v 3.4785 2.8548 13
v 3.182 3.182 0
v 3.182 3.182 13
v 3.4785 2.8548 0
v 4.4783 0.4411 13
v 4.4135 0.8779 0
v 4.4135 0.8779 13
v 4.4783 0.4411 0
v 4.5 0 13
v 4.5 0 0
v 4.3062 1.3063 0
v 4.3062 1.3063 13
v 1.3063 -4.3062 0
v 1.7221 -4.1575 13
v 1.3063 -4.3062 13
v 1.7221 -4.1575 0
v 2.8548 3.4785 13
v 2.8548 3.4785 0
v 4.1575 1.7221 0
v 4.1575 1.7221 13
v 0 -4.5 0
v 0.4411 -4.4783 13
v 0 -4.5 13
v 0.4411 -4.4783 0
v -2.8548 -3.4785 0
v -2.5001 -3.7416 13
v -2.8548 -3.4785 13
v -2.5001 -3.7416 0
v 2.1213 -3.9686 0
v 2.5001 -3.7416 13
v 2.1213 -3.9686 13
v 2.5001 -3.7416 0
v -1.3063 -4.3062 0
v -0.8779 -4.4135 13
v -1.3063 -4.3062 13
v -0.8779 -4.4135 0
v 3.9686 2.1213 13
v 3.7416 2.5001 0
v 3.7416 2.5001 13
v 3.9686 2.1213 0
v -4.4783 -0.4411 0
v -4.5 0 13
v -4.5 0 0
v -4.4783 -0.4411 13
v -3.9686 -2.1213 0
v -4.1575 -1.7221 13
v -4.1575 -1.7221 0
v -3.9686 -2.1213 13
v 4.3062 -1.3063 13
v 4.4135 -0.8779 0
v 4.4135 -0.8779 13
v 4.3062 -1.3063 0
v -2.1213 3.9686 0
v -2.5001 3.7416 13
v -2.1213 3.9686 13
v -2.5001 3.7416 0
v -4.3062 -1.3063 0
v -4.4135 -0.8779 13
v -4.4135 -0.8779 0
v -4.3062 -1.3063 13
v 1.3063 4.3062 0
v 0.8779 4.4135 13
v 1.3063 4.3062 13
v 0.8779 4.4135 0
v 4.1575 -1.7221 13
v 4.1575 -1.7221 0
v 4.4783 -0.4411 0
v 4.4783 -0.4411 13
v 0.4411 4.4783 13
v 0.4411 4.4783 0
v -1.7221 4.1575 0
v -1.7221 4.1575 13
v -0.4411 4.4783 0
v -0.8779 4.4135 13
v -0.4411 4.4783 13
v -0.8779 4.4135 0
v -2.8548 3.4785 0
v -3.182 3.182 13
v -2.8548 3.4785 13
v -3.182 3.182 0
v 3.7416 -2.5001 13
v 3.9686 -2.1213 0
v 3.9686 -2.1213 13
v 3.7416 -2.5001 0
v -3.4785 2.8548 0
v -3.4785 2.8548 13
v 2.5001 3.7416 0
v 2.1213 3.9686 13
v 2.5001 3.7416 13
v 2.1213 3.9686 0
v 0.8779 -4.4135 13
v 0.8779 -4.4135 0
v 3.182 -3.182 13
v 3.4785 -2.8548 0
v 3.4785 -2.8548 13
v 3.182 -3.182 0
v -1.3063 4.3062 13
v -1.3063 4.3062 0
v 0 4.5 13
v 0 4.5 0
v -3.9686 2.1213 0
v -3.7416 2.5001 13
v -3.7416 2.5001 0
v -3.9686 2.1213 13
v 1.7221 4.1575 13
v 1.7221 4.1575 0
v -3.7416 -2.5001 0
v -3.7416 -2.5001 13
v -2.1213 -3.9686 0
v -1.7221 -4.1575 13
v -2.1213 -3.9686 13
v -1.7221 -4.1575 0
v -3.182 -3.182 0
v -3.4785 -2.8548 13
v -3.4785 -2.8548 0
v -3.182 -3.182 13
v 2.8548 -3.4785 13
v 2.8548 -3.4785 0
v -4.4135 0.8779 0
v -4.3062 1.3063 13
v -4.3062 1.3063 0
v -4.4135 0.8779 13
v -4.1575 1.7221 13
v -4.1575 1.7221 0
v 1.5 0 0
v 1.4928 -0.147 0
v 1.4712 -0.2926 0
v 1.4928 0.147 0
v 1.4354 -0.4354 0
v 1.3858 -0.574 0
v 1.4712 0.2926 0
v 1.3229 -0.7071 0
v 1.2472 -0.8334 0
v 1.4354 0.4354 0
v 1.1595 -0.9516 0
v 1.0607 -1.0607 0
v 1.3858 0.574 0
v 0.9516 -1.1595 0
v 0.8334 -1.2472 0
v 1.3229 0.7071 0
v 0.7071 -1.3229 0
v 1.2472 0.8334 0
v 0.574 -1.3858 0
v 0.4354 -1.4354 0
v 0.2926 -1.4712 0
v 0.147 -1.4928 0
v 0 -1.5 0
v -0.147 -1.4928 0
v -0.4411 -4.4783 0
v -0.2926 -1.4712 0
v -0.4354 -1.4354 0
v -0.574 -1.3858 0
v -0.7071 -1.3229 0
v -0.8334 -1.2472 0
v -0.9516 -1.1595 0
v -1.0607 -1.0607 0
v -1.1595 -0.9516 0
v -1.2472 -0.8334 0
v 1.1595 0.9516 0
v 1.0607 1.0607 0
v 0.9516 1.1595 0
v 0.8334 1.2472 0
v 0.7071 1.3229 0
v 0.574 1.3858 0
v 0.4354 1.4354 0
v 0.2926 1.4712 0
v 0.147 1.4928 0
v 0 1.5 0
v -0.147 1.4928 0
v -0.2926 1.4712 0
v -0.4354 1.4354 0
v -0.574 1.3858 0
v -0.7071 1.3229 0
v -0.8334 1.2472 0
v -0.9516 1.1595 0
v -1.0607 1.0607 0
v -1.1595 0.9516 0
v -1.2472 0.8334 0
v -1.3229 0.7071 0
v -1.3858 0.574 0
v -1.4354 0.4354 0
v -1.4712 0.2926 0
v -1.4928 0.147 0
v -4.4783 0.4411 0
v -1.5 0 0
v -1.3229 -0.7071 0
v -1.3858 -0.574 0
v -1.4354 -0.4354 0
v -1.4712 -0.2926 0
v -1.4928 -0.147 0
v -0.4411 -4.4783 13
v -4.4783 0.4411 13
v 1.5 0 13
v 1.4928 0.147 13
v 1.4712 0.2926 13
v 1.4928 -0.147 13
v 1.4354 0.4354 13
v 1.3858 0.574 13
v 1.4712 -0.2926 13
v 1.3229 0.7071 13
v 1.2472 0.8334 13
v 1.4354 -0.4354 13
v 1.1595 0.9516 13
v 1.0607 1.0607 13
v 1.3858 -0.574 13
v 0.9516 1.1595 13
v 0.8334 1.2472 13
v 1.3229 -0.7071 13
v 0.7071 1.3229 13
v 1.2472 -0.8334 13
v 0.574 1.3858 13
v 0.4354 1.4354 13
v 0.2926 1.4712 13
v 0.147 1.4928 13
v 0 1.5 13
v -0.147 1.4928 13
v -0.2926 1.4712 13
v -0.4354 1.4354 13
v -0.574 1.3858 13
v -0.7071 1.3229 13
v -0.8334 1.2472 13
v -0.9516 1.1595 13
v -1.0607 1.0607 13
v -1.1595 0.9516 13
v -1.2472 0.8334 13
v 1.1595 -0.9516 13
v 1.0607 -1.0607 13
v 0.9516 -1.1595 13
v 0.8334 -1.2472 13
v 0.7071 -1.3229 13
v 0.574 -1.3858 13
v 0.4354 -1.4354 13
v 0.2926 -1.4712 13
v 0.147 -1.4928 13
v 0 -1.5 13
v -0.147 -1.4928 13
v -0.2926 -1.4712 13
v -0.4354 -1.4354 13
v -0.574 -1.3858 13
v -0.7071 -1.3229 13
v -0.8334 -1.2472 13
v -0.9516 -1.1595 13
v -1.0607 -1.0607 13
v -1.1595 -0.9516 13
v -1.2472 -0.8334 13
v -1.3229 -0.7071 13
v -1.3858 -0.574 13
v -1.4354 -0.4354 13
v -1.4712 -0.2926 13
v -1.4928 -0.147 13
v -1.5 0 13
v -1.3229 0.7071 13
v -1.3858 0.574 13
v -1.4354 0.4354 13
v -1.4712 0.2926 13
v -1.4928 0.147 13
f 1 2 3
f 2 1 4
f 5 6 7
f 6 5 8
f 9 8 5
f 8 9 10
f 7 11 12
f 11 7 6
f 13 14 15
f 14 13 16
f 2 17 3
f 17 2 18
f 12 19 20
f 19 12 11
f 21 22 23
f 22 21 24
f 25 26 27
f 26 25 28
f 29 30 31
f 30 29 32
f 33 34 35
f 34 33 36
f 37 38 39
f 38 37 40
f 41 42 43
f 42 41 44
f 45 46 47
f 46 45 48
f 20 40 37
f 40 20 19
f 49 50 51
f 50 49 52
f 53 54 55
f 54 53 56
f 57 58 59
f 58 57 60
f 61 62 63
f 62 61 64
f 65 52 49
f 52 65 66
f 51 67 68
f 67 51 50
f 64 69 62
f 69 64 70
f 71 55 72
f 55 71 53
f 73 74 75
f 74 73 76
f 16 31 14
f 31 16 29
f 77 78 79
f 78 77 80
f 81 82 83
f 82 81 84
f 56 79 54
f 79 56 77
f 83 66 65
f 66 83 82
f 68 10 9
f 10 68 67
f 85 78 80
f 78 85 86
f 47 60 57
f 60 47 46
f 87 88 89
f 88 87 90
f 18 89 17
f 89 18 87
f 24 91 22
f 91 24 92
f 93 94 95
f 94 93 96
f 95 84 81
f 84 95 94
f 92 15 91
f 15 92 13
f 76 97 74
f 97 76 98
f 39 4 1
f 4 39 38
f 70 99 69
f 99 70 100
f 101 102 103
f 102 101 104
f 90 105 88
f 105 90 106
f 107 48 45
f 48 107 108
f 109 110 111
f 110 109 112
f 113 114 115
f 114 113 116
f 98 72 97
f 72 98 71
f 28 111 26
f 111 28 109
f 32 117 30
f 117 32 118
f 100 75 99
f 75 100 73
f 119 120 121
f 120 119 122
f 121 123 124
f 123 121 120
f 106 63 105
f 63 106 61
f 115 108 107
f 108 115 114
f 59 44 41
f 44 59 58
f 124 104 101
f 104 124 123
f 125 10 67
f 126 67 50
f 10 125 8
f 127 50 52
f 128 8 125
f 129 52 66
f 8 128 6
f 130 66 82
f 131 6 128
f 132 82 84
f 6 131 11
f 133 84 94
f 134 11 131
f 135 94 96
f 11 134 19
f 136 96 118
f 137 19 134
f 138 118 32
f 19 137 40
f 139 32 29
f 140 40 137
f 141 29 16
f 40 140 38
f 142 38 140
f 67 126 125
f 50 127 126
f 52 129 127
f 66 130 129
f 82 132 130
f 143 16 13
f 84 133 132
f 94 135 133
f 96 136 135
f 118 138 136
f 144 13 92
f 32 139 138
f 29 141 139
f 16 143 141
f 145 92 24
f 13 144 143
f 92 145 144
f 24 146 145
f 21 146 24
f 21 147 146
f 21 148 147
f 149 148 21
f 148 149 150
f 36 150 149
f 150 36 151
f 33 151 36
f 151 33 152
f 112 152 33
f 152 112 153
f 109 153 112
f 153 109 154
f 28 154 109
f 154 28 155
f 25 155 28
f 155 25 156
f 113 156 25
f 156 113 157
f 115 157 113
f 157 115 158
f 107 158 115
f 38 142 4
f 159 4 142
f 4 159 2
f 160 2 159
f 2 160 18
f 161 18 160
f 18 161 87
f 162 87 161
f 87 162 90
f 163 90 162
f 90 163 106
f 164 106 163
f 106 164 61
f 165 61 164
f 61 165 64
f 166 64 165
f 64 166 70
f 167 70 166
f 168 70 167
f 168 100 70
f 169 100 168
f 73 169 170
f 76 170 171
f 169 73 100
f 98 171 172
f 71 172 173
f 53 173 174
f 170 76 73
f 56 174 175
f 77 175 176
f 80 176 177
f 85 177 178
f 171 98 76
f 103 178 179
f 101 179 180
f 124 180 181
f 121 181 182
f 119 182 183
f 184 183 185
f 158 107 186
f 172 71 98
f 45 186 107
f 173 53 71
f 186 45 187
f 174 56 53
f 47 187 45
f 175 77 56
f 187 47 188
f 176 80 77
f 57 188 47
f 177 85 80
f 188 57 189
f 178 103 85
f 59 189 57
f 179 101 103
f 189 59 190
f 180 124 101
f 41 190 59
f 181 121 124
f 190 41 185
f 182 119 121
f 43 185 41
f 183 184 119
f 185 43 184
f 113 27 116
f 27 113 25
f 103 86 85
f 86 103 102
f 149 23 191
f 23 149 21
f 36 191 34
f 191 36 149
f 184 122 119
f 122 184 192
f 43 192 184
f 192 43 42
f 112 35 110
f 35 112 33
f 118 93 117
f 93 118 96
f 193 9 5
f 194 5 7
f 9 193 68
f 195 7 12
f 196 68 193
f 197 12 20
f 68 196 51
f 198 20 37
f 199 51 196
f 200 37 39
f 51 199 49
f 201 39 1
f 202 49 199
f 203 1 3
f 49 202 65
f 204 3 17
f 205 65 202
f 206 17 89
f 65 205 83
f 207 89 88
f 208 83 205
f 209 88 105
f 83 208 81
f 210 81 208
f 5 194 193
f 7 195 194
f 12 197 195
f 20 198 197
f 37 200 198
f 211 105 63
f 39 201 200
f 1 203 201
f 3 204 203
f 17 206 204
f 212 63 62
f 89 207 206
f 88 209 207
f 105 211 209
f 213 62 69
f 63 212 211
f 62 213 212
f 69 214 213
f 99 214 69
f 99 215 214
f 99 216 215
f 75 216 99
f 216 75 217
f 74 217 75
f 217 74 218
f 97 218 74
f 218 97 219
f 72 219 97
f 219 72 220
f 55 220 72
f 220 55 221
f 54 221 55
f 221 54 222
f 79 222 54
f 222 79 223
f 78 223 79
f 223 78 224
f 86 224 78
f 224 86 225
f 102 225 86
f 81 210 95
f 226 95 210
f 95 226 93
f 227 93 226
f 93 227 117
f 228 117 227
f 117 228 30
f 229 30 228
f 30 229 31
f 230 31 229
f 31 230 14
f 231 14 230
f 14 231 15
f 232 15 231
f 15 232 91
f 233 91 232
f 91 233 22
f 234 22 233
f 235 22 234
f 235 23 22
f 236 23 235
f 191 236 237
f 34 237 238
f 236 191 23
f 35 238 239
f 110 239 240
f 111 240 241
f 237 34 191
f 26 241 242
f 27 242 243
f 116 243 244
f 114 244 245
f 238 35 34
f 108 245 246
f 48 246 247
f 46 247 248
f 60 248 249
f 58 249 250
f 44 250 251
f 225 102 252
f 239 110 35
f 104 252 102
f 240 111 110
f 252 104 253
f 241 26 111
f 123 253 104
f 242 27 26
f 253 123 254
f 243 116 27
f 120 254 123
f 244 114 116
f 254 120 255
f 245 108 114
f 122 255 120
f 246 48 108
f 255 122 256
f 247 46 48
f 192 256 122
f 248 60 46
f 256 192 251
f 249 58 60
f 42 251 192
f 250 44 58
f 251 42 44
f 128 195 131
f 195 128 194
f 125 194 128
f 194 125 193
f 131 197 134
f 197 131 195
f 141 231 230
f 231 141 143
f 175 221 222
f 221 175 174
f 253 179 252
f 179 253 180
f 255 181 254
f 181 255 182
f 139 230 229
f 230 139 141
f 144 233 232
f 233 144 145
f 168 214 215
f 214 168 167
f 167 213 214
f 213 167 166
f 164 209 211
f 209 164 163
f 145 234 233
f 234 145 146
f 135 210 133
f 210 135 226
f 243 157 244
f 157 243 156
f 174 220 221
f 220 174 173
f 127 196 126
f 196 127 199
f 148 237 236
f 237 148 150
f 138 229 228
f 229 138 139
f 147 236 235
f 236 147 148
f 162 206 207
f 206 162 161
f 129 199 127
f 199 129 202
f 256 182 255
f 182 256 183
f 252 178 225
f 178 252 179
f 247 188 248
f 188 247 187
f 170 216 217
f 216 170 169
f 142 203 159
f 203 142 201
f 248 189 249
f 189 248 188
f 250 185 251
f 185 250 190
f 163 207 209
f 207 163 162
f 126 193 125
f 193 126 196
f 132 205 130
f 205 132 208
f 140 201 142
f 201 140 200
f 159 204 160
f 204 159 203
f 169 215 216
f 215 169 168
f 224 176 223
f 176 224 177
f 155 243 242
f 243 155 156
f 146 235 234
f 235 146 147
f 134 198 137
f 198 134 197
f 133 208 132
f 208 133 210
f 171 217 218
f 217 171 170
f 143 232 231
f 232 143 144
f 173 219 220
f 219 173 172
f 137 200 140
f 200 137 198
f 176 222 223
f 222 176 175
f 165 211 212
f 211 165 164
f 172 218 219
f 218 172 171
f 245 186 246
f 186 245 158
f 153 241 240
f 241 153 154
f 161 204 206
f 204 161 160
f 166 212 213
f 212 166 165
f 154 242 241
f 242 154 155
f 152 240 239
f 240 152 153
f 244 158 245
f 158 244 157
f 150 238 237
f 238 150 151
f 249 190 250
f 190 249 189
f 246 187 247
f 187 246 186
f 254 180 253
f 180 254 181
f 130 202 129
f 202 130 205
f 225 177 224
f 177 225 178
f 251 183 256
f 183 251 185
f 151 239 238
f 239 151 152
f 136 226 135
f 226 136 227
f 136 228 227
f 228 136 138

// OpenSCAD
module standoff_pillar() {
    difference() {
        cylinder(h = 13.0, d = 9.0, $fn = 64);
        translate([0, 0, -1])
            cylinder(h = 15.0, d = 3.0, $fn = 64);
    }
}

standoff_pillar();
